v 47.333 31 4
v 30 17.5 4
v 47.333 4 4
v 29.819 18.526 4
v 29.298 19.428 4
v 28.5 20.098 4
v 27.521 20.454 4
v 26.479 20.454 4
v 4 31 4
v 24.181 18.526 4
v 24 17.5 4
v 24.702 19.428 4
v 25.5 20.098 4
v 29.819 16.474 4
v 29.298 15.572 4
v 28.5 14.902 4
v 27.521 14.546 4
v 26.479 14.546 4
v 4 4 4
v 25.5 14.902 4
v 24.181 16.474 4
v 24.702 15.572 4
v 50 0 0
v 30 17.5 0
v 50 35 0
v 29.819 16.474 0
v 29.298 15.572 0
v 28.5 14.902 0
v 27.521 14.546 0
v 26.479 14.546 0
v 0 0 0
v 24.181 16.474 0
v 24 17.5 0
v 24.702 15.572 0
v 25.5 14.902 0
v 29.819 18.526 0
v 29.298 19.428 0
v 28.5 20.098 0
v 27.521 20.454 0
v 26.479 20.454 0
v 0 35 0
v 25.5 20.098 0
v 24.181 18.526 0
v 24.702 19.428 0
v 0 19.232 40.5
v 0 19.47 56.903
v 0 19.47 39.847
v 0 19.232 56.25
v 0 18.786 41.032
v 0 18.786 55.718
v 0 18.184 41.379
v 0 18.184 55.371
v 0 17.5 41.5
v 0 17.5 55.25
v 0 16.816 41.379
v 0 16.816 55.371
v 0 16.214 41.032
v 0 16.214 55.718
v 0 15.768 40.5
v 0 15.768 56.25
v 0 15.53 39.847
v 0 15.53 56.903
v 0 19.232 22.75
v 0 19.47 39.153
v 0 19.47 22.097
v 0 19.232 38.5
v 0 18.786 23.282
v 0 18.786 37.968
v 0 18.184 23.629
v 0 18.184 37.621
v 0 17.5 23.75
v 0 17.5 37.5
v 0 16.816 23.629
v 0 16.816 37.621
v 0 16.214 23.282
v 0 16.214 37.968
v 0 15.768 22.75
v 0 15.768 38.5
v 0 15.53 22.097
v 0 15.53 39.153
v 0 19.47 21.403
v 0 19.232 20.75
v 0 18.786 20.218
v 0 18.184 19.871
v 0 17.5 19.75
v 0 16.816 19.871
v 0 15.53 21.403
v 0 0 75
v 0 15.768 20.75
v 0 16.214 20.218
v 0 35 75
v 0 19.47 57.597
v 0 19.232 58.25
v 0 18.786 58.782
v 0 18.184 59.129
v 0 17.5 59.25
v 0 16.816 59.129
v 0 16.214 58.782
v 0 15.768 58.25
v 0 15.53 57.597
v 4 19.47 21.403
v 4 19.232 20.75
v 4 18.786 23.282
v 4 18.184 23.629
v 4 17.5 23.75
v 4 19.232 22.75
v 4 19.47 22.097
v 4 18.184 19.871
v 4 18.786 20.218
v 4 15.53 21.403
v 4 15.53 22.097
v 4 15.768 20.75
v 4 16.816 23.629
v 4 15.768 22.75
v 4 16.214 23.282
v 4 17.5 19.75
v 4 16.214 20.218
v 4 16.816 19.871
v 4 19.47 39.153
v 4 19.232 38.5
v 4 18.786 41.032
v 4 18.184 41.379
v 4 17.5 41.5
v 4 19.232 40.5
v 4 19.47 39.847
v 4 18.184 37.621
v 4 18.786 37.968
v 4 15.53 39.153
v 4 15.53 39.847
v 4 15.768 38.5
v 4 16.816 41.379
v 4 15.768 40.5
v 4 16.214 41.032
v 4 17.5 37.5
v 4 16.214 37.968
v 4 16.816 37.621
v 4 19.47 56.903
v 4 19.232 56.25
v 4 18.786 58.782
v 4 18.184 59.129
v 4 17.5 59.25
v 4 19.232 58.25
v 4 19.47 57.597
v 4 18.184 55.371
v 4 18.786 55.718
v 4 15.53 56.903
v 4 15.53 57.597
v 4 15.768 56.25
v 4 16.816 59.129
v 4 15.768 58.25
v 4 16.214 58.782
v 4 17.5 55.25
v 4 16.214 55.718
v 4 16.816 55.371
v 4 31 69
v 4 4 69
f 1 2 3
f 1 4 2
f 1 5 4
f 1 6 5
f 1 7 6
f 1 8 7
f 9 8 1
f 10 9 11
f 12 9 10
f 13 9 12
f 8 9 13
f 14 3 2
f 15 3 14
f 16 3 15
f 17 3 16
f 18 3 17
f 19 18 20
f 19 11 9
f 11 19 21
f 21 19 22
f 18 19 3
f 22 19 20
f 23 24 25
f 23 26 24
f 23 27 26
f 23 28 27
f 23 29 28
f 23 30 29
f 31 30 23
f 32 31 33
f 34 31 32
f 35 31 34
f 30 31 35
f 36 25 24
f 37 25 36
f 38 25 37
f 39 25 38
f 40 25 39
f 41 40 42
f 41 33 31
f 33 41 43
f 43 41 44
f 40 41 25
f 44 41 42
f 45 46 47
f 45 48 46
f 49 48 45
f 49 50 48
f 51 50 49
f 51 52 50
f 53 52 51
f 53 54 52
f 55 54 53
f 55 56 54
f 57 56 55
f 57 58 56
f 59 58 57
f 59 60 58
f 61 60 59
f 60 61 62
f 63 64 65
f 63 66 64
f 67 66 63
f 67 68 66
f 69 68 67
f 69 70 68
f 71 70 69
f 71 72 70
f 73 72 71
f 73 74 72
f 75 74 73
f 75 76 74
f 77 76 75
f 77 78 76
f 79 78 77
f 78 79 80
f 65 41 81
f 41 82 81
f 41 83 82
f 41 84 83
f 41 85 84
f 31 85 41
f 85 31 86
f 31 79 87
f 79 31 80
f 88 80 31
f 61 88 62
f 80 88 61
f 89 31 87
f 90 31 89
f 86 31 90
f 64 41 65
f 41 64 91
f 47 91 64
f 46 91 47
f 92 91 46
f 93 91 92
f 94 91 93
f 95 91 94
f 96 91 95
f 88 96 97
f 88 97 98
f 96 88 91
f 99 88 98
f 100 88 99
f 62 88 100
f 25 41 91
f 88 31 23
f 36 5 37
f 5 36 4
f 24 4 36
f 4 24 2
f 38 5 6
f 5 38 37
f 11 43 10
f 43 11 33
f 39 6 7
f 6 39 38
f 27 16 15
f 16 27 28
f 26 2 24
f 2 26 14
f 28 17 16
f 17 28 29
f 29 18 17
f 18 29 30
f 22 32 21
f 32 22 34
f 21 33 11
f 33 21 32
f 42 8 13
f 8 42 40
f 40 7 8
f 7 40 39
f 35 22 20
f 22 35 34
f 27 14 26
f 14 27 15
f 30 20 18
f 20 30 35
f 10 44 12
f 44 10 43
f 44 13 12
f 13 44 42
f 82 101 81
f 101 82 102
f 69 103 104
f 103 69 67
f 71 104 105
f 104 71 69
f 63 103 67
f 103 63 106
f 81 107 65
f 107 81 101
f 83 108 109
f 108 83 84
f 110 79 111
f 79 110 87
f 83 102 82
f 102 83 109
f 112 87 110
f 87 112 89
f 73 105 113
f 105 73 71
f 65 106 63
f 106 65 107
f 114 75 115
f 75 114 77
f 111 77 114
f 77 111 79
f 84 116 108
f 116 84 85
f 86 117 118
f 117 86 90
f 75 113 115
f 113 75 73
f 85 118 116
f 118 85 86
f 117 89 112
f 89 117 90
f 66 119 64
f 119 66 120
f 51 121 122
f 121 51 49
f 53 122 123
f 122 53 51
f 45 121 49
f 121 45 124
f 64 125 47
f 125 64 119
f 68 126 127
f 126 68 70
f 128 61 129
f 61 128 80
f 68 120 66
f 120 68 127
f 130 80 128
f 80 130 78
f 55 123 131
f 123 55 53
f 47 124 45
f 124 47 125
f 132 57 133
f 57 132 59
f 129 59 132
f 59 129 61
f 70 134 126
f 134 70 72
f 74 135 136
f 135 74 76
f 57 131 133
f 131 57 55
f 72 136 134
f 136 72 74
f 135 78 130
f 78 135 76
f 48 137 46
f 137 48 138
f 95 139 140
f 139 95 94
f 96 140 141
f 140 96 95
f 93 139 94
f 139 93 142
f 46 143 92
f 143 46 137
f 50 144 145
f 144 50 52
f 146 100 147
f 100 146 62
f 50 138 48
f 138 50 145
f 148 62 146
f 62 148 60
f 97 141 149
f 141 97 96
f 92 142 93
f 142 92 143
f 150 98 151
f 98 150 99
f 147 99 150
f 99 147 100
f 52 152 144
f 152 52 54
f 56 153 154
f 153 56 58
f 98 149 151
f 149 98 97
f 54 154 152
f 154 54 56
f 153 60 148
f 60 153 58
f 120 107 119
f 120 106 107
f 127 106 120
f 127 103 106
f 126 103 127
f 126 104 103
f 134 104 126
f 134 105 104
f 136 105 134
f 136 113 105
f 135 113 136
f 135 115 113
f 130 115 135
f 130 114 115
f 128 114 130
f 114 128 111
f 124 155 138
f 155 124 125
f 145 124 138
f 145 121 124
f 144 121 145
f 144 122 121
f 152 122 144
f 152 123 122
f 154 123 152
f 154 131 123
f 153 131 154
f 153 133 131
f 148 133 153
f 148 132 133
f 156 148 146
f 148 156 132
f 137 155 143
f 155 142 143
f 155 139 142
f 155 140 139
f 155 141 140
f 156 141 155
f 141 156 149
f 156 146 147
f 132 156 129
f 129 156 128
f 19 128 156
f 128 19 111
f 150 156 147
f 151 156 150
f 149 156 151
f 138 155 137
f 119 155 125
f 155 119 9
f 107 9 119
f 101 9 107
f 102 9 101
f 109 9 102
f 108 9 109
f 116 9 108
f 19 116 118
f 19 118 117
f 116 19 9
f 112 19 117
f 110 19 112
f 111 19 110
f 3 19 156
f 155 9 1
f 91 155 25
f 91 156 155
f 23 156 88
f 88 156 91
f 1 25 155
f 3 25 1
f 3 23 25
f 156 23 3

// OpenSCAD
/*
	module shelf_bracket

	parameters:	
	- side_a    is a vector [length, hole diameter, number of holes]
	- side_b    is a vector [length, hole diameter, number of holes]
	- width     refers to the width of the bracket
	- thickness refers to the material thickness of the bracket
 */

module shelf_bracket( side_a, side_b, width, thickness, rotate_it = false ) {

	module xhole_plate(size, h_dm, h_num, margin) {
		
		difference(){

			cube(size);

			h_distance = (size.x - margin) / (h_num + 1);

		    for (x = [1:h_num])
		    translate ([
		        margin + x * h_distance,
		        size.y/2,
		        -1
		    ]) cylinder( d = h_dm, h = size.z + 2, $fn=18);

		}		
	}

	diag  = sqrt( pow(side_a[0], 2) + pow(side_b[0], 2) );
	angle = asin( side_a[0] / diag );

	rotate( [0, rotate_it ? 90 + angle : 0, 0] )
	difference() {

		union() {

			// side A
			xhole_plate(
				[side_a[0], width, thickness],
				side_a[1],
				side_a[2],
				thickness
			);

			// side B
		    translate([thickness,0,0])
		    rotate([0,-90,0])
			xhole_plate(
				[side_b[0], width, thickness],
				side_b[1],
				side_b[2],
				thickness
			);

			// stringer
			cube( [side_a[0], thickness, side_b[0]] );

			translate( [0, width - thickness, 0] )
			cube( [side_a[0], thickness, side_b[0]] );

		}

	    translate( [side_a[0], -1, 0] )
	    rotate( [0, -angle, 0] )
	    cube( [diag, width + 2, diag + 2] );

	}

}

module output(templates = false) {

	if (templates) {

		projection(cut = true)
		children(0);		

		translate( [-0.01, 0, 0] )
		projection(cut = true)
		rotate( [0, -90, 0] )
		children(0);		

	} else {

		children(0);

	}

}

output(templates = false)
shelf_bracket(
  side_a    = [50, 6, 1],
  side_b    = [75, 4, 3],
  width     = 35,
  thickness = 4,
  rotate_it = false
);
